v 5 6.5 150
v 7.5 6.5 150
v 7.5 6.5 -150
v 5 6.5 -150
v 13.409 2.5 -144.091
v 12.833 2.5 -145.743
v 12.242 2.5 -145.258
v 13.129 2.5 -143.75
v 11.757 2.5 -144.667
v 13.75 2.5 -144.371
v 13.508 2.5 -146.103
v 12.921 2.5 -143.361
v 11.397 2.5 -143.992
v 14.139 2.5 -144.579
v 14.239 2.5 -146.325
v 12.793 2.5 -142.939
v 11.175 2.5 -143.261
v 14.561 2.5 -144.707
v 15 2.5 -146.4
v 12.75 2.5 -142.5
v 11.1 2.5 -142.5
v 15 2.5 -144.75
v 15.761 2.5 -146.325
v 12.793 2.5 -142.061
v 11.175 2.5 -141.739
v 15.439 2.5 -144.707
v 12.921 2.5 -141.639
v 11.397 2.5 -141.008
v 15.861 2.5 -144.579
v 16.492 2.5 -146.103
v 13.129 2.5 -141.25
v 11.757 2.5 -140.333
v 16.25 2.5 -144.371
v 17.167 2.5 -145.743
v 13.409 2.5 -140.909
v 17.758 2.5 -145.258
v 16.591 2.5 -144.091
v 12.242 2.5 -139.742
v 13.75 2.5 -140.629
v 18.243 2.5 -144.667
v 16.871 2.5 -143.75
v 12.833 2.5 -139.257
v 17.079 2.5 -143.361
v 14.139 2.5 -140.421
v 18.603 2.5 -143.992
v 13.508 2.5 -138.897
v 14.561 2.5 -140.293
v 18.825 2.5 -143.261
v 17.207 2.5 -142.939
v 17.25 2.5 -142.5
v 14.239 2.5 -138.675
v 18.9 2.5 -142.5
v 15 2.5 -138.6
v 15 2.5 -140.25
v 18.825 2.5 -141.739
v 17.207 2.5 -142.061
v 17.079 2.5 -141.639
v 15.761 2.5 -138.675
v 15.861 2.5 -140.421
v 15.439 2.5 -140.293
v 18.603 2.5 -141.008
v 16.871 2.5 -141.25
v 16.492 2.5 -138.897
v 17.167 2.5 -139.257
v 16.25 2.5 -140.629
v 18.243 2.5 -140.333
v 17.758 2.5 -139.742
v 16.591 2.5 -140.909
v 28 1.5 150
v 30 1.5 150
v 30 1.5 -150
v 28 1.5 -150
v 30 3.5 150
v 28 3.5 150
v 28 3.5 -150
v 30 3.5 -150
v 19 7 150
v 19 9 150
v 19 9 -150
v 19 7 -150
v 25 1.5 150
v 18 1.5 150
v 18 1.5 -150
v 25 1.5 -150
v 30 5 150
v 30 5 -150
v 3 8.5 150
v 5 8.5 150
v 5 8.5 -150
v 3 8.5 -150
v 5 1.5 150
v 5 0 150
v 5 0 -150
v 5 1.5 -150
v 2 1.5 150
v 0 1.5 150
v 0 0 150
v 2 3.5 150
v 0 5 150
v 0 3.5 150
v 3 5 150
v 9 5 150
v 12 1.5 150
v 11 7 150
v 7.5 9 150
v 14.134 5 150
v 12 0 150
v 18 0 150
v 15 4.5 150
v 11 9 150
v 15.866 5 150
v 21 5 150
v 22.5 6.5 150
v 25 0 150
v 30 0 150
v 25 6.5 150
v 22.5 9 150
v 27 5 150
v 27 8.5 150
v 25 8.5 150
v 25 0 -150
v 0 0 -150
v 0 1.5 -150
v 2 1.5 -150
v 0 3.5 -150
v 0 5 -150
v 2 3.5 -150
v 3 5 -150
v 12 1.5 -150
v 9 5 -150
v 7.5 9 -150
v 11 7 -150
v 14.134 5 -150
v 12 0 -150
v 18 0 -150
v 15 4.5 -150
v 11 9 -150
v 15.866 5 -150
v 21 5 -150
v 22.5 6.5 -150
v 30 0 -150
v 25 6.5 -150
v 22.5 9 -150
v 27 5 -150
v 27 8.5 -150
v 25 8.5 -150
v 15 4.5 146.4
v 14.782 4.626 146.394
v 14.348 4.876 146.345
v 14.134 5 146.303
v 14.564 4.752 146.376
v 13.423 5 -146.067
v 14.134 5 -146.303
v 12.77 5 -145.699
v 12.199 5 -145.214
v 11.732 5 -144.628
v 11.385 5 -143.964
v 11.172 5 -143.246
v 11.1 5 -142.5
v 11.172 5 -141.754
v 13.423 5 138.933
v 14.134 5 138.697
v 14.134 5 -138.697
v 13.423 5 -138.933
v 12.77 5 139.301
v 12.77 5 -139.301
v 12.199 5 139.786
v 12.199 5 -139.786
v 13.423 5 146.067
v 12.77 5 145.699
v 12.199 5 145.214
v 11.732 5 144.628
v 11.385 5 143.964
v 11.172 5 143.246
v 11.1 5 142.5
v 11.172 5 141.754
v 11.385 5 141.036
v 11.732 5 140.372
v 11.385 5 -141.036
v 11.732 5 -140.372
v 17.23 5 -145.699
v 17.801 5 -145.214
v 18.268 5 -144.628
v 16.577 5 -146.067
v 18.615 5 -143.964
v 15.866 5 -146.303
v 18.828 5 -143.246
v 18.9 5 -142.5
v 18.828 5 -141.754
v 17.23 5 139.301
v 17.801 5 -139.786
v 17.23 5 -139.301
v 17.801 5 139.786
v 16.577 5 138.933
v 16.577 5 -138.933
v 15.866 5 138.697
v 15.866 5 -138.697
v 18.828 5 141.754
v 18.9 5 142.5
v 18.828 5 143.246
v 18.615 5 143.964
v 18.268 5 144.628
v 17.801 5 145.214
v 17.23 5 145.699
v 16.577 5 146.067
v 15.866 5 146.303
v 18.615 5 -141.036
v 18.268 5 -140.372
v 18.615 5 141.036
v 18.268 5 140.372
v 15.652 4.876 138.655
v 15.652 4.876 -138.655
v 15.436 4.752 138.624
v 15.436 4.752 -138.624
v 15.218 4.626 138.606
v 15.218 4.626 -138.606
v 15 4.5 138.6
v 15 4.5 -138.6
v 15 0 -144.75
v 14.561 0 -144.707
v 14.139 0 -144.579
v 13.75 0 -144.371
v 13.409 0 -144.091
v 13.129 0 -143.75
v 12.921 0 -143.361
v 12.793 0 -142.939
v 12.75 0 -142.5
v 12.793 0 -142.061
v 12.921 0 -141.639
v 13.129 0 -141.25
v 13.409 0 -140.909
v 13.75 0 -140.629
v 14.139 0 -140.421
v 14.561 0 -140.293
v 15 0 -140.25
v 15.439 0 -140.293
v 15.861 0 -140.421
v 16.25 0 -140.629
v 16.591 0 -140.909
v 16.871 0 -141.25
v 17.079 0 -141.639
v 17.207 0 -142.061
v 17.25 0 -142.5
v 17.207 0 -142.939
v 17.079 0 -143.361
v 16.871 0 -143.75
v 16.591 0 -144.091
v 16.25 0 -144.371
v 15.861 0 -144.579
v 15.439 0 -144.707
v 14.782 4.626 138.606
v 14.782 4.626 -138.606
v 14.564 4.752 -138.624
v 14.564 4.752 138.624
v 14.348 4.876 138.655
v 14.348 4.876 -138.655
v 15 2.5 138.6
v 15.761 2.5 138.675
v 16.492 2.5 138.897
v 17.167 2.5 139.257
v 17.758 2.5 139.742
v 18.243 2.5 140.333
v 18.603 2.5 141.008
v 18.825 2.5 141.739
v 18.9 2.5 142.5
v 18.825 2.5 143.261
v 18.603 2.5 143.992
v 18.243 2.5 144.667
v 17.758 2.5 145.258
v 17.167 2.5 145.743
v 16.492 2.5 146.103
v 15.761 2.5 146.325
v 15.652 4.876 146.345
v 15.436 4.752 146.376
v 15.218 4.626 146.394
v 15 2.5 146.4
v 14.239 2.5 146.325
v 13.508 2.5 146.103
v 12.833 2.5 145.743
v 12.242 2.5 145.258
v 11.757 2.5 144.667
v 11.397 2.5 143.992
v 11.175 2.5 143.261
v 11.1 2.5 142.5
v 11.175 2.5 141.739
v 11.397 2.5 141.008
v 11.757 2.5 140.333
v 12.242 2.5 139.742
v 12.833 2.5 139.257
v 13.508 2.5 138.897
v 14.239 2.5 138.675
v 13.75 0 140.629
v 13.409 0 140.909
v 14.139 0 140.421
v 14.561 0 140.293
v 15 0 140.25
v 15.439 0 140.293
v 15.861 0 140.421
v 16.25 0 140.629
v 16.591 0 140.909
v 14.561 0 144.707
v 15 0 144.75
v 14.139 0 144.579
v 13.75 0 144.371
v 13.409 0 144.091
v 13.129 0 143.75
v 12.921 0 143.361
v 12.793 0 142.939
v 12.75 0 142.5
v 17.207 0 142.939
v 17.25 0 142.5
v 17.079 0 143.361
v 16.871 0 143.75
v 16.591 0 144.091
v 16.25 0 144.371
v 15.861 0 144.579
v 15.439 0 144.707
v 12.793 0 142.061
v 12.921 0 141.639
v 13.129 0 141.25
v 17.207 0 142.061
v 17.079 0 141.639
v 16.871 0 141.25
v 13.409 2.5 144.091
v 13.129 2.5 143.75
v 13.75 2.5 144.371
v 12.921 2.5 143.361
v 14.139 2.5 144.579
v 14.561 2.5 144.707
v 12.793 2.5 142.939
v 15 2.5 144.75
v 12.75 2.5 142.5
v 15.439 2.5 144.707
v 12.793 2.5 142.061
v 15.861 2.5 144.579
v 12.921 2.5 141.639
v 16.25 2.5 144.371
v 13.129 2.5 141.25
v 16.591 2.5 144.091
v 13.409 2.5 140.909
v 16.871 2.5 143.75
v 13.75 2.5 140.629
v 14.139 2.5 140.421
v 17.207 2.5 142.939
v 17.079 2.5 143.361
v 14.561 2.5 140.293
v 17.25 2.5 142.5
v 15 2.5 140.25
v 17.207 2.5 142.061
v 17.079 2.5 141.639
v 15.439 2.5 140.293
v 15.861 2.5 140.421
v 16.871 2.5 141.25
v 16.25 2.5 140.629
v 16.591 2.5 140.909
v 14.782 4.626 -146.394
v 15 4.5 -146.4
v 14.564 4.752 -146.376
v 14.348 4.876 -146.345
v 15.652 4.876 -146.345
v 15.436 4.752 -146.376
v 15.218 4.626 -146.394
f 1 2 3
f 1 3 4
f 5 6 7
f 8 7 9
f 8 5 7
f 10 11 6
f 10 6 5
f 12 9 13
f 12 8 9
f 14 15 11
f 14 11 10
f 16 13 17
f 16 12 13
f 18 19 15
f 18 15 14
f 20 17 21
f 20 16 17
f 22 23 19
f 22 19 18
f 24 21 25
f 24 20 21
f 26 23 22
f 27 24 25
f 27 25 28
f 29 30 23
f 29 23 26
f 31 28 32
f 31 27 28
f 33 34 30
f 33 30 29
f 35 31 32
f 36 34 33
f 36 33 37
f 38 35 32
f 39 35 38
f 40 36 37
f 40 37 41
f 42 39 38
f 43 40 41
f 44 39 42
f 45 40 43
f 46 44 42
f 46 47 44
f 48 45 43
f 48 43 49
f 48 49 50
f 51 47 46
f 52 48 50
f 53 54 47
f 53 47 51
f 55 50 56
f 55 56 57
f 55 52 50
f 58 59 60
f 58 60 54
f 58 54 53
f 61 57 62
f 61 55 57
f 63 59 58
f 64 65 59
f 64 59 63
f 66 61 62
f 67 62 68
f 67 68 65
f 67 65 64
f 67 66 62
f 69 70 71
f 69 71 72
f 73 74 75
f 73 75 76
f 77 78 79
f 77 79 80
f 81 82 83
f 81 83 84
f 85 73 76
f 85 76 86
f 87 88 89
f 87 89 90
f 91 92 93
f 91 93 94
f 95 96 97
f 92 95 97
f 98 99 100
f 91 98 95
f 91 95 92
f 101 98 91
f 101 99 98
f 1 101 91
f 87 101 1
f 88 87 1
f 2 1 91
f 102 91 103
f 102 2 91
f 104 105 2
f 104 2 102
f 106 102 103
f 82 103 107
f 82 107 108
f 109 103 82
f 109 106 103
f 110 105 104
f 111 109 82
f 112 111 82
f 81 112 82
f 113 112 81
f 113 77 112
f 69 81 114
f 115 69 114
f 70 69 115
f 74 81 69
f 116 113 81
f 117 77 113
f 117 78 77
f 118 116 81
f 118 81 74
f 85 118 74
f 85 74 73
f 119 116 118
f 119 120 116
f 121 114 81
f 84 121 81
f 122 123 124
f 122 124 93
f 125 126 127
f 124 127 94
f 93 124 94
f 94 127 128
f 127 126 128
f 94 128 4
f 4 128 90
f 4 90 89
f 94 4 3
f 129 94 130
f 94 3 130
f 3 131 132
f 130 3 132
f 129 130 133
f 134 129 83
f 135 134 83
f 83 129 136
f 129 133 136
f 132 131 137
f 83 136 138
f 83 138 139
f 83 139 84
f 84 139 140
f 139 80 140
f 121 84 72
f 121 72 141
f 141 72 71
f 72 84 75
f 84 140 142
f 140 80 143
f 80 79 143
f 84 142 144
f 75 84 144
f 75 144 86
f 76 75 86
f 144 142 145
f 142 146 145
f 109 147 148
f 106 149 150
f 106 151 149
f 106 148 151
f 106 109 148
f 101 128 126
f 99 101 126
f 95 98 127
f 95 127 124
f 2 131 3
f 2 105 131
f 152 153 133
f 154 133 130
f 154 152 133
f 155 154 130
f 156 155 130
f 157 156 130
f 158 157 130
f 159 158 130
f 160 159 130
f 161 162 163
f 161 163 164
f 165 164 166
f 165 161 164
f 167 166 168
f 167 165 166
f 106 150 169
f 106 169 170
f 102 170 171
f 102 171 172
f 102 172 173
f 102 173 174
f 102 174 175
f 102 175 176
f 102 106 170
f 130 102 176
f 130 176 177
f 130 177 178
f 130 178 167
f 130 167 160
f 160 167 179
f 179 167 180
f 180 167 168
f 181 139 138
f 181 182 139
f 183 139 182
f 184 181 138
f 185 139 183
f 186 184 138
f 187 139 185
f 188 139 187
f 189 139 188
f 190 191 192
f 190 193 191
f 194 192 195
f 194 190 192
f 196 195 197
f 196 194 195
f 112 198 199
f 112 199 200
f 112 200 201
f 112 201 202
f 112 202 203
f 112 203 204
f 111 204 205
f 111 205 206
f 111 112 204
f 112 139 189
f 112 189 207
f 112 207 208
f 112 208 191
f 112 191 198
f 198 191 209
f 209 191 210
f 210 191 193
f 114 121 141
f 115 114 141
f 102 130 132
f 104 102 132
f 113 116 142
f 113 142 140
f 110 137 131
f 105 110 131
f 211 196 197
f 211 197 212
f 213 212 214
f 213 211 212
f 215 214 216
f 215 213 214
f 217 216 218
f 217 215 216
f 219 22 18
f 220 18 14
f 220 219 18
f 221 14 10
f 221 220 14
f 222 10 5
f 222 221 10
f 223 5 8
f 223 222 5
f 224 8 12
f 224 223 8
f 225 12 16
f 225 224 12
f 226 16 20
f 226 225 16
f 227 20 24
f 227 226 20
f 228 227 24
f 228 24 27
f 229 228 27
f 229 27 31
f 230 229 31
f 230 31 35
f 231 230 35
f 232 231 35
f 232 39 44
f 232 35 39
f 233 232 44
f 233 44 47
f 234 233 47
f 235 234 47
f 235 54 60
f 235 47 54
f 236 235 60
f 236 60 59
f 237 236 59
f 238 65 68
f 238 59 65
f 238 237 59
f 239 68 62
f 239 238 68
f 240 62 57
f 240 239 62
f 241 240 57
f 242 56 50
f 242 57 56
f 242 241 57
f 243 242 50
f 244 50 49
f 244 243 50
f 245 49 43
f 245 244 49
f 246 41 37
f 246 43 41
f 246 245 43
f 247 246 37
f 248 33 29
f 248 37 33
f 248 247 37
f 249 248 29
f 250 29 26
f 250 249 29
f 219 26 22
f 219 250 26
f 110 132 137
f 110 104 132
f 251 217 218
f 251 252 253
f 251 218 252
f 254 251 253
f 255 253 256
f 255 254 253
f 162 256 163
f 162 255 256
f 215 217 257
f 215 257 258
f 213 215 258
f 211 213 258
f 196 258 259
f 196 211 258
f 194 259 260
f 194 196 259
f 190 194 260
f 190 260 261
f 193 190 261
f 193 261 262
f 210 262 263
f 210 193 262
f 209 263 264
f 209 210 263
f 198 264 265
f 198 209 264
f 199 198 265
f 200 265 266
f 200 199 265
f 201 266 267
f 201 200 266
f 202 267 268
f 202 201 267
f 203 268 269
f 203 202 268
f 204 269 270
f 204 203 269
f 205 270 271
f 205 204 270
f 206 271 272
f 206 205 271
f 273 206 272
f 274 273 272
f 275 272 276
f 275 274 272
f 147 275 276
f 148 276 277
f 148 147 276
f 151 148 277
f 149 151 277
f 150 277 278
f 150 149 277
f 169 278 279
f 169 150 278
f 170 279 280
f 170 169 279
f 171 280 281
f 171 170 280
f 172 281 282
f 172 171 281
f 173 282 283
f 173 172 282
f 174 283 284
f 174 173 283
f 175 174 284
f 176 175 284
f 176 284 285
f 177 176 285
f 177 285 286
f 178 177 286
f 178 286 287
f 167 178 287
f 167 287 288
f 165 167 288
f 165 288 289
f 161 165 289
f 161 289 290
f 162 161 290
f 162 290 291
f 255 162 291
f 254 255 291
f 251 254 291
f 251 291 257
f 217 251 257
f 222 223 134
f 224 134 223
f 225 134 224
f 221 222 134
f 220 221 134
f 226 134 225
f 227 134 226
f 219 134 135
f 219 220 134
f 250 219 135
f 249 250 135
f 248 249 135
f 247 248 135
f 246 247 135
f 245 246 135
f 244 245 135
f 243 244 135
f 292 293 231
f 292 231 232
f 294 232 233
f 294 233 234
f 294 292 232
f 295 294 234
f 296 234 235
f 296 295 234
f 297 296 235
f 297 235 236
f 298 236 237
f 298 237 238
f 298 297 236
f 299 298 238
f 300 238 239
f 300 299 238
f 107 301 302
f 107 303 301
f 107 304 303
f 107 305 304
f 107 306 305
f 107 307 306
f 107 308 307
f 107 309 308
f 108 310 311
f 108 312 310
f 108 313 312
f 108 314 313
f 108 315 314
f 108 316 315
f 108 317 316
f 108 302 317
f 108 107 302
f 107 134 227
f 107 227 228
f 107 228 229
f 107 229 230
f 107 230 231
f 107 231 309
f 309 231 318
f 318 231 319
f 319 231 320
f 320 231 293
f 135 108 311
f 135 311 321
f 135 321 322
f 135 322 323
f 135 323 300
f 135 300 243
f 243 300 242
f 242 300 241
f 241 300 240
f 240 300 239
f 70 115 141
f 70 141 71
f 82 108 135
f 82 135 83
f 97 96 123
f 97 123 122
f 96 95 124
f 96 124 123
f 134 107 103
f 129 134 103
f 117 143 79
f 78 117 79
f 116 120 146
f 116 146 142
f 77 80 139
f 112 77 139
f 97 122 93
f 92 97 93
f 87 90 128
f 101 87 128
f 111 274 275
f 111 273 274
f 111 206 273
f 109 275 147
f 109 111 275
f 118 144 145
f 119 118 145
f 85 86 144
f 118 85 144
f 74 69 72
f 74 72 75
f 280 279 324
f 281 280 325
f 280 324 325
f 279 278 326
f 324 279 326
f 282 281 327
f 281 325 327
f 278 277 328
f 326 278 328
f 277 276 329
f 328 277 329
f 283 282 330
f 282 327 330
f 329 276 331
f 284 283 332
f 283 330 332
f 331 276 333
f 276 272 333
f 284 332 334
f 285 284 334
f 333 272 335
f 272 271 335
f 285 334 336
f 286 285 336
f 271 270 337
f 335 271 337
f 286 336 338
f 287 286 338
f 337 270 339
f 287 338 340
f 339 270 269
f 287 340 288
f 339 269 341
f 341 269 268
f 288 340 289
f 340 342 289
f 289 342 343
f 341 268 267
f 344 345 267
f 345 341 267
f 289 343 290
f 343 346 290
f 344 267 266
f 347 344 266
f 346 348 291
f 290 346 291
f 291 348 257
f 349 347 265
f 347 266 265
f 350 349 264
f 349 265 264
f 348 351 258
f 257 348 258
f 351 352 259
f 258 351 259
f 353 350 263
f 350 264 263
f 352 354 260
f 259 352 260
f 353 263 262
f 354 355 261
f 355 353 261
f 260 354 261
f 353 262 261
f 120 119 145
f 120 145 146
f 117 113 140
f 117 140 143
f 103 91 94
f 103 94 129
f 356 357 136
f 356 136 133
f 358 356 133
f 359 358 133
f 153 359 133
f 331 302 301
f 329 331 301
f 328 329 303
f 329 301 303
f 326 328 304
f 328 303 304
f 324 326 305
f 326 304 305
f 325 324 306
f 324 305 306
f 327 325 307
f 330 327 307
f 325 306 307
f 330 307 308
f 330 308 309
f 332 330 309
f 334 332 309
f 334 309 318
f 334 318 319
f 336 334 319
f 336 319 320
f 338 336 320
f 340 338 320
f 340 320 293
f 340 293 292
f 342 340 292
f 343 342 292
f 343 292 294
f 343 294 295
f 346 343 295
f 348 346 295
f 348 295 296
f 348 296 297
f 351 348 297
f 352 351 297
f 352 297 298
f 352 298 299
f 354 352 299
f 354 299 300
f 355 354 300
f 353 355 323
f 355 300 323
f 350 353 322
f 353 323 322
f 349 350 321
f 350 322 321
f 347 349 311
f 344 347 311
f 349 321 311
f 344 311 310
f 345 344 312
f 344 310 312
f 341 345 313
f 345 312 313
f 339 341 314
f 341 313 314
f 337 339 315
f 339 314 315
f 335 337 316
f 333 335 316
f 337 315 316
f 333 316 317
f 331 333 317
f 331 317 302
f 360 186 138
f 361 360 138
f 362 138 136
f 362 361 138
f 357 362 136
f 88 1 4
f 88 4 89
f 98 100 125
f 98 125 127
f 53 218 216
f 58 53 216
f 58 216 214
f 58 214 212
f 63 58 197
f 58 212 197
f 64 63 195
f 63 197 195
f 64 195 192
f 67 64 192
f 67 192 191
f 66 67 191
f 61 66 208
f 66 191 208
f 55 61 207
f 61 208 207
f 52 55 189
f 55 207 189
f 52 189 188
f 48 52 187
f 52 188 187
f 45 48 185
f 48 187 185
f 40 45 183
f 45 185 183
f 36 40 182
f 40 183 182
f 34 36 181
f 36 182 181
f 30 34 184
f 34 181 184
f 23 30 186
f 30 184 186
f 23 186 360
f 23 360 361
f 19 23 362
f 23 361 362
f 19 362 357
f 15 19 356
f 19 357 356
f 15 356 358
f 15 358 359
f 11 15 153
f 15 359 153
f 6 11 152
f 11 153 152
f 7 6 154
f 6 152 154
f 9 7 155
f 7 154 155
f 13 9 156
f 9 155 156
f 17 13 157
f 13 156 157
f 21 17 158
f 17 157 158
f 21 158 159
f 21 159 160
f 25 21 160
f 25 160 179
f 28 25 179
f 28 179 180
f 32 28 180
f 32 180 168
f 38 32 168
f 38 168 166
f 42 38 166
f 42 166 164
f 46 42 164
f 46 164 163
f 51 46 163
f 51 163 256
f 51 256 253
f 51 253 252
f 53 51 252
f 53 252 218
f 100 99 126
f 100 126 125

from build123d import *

# Parameters (mm, degrees)
EXTRUDE_1_DEPTH     = 150
CUT_EXTRUDE_2_REACH = 302
SKETCH_3_W          = 7
SKETCH_3_H          = 1.5
CUT_EXTRUDE_START   = -5
SKETCH_4_R          = 2.25
CUT_EXTRUDE_3_DEPTH = 5
SKETCH_5_R          = 3.9
CUT_EXTRUDE_4_DEPTH = 2.5


with BuildPart() as part:
    # 草图1 → 凸台-拉伸1 (new body, symmetric)
    with BuildSketch(Plane.XY):
        Polygon((7.5, 9), (7.5, 6.5), (5, 6.5), (5, 8.5), (3, 8.5), (3, 5), (0, 5), (0, 3.5), (2, 3.5), (2, 1.5), (0, 1.5), (0, 0), (30, 0), (30, 1.5), (28, 1.5), (28, 3.5), (30, 3.5), (30, 5), (27, 5), (27, 8.5), (25, 8.5), (25, 6.5), (22.5, 6.5), (22.5, 9), (19, 9), (19, 7), (21, 5), (9, 5), (11, 7), (11, 9), align=None)
    extrude(amount=EXTRUDE_1_DEPTH, both=True)

    # 草图3 → 切除-拉伸2 (cut, up to next)
    with BuildSketch(Plane.XY.offset(150), mode=Mode.PRIVATE) as cut_extrude_2_sk1:
        with Locations((8.5, 0.75)):
            Rectangle(SKETCH_3_W, SKETCH_3_H)
    cut_extrude_2_tool1 = extrude(cut_extrude_2_sk1.sketch, amount=-CUT_EXTRUDE_2_REACH, mode=Mode.PRIVATE) & part.part
    add(cut_extrude_2_tool1.solids().sort_by_distance((8.5, 0.75, 150))[0], mode=Mode.SUBTRACT)
    # 草图3 → 切除-拉伸2 (cut, up to next)
    with BuildSketch(Plane.XY.offset(150), mode=Mode.PRIVATE) as cut_extrude_2_sk2:
        with Locations((21.5, 0.75)):
            Rectangle(SKETCH_3_W, SKETCH_3_H)
    cut_extrude_2_tool2 = extrude(cut_extrude_2_sk2.sketch, amount=-CUT_EXTRUDE_2_REACH, mode=Mode.PRIVATE) & part.part
    add(cut_extrude_2_tool2.solids().sort_by_distance((21.5, 0.75, 150))[0], mode=Mode.SUBTRACT)
    # 草图3 → 切除-拉伸2 (cut, up to next)
    with BuildSketch(Plane.XY.offset(150), mode=Mode.PRIVATE) as cut_extrude_2_sk3:
        Polygon((14.133974596, 5), (15.866025404, 5), (15, 4.5), align=None)
    cut_extrude_2_tool3 = extrude(cut_extrude_2_sk3.sketch, amount=-CUT_EXTRUDE_2_REACH, mode=Mode.PRIVATE) & part.part
    add(cut_extrude_2_tool3.solids().sort_by_distance((15, 4.833333, 150))[0], mode=Mode.SUBTRACT)

    # 草图4 → 切除-拉伸3 (cut)
    with BuildSketch(Plane(origin=(0, 5, 0), x_dir=(1, 0, 0), z_dir=(0, 1, 0)).offset(CUT_EXTRUDE_START)):
        with Locations(Location((15, 142.5, 0), (0, 0, 90))):  # turned: the seam where the file's is
            Circle(SKETCH_4_R)
    cut_extrude_3 = extrude(amount=CUT_EXTRUDE_3_DEPTH, mode=Mode.SUBTRACT)

    # 草图5 → 切除-拉伸4 (cut)
    with BuildSketch(Plane(origin=(0, 5, 0), x_dir=(1, 0, 0), z_dir=(0, 1, 0))):
        with Locations(Location((15, 142.5, 0), (0, 0, 270))):  # turned: the seam where the file's is
            Circle(SKETCH_5_R)
    cut_extrude_4 = extrude(amount=-CUT_EXTRUDE_4_DEPTH, mode=Mode.SUBTRACT)

    # 镜向1: 切除-拉伸3, 切除-拉伸4 across plane
    add(cut_extrude_3.mirror(Plane.XY), mode=Mode.SUBTRACT)
    add(cut_extrude_4.mirror(Plane.XY), mode=Mode.SUBTRACT)


solid = part.part
